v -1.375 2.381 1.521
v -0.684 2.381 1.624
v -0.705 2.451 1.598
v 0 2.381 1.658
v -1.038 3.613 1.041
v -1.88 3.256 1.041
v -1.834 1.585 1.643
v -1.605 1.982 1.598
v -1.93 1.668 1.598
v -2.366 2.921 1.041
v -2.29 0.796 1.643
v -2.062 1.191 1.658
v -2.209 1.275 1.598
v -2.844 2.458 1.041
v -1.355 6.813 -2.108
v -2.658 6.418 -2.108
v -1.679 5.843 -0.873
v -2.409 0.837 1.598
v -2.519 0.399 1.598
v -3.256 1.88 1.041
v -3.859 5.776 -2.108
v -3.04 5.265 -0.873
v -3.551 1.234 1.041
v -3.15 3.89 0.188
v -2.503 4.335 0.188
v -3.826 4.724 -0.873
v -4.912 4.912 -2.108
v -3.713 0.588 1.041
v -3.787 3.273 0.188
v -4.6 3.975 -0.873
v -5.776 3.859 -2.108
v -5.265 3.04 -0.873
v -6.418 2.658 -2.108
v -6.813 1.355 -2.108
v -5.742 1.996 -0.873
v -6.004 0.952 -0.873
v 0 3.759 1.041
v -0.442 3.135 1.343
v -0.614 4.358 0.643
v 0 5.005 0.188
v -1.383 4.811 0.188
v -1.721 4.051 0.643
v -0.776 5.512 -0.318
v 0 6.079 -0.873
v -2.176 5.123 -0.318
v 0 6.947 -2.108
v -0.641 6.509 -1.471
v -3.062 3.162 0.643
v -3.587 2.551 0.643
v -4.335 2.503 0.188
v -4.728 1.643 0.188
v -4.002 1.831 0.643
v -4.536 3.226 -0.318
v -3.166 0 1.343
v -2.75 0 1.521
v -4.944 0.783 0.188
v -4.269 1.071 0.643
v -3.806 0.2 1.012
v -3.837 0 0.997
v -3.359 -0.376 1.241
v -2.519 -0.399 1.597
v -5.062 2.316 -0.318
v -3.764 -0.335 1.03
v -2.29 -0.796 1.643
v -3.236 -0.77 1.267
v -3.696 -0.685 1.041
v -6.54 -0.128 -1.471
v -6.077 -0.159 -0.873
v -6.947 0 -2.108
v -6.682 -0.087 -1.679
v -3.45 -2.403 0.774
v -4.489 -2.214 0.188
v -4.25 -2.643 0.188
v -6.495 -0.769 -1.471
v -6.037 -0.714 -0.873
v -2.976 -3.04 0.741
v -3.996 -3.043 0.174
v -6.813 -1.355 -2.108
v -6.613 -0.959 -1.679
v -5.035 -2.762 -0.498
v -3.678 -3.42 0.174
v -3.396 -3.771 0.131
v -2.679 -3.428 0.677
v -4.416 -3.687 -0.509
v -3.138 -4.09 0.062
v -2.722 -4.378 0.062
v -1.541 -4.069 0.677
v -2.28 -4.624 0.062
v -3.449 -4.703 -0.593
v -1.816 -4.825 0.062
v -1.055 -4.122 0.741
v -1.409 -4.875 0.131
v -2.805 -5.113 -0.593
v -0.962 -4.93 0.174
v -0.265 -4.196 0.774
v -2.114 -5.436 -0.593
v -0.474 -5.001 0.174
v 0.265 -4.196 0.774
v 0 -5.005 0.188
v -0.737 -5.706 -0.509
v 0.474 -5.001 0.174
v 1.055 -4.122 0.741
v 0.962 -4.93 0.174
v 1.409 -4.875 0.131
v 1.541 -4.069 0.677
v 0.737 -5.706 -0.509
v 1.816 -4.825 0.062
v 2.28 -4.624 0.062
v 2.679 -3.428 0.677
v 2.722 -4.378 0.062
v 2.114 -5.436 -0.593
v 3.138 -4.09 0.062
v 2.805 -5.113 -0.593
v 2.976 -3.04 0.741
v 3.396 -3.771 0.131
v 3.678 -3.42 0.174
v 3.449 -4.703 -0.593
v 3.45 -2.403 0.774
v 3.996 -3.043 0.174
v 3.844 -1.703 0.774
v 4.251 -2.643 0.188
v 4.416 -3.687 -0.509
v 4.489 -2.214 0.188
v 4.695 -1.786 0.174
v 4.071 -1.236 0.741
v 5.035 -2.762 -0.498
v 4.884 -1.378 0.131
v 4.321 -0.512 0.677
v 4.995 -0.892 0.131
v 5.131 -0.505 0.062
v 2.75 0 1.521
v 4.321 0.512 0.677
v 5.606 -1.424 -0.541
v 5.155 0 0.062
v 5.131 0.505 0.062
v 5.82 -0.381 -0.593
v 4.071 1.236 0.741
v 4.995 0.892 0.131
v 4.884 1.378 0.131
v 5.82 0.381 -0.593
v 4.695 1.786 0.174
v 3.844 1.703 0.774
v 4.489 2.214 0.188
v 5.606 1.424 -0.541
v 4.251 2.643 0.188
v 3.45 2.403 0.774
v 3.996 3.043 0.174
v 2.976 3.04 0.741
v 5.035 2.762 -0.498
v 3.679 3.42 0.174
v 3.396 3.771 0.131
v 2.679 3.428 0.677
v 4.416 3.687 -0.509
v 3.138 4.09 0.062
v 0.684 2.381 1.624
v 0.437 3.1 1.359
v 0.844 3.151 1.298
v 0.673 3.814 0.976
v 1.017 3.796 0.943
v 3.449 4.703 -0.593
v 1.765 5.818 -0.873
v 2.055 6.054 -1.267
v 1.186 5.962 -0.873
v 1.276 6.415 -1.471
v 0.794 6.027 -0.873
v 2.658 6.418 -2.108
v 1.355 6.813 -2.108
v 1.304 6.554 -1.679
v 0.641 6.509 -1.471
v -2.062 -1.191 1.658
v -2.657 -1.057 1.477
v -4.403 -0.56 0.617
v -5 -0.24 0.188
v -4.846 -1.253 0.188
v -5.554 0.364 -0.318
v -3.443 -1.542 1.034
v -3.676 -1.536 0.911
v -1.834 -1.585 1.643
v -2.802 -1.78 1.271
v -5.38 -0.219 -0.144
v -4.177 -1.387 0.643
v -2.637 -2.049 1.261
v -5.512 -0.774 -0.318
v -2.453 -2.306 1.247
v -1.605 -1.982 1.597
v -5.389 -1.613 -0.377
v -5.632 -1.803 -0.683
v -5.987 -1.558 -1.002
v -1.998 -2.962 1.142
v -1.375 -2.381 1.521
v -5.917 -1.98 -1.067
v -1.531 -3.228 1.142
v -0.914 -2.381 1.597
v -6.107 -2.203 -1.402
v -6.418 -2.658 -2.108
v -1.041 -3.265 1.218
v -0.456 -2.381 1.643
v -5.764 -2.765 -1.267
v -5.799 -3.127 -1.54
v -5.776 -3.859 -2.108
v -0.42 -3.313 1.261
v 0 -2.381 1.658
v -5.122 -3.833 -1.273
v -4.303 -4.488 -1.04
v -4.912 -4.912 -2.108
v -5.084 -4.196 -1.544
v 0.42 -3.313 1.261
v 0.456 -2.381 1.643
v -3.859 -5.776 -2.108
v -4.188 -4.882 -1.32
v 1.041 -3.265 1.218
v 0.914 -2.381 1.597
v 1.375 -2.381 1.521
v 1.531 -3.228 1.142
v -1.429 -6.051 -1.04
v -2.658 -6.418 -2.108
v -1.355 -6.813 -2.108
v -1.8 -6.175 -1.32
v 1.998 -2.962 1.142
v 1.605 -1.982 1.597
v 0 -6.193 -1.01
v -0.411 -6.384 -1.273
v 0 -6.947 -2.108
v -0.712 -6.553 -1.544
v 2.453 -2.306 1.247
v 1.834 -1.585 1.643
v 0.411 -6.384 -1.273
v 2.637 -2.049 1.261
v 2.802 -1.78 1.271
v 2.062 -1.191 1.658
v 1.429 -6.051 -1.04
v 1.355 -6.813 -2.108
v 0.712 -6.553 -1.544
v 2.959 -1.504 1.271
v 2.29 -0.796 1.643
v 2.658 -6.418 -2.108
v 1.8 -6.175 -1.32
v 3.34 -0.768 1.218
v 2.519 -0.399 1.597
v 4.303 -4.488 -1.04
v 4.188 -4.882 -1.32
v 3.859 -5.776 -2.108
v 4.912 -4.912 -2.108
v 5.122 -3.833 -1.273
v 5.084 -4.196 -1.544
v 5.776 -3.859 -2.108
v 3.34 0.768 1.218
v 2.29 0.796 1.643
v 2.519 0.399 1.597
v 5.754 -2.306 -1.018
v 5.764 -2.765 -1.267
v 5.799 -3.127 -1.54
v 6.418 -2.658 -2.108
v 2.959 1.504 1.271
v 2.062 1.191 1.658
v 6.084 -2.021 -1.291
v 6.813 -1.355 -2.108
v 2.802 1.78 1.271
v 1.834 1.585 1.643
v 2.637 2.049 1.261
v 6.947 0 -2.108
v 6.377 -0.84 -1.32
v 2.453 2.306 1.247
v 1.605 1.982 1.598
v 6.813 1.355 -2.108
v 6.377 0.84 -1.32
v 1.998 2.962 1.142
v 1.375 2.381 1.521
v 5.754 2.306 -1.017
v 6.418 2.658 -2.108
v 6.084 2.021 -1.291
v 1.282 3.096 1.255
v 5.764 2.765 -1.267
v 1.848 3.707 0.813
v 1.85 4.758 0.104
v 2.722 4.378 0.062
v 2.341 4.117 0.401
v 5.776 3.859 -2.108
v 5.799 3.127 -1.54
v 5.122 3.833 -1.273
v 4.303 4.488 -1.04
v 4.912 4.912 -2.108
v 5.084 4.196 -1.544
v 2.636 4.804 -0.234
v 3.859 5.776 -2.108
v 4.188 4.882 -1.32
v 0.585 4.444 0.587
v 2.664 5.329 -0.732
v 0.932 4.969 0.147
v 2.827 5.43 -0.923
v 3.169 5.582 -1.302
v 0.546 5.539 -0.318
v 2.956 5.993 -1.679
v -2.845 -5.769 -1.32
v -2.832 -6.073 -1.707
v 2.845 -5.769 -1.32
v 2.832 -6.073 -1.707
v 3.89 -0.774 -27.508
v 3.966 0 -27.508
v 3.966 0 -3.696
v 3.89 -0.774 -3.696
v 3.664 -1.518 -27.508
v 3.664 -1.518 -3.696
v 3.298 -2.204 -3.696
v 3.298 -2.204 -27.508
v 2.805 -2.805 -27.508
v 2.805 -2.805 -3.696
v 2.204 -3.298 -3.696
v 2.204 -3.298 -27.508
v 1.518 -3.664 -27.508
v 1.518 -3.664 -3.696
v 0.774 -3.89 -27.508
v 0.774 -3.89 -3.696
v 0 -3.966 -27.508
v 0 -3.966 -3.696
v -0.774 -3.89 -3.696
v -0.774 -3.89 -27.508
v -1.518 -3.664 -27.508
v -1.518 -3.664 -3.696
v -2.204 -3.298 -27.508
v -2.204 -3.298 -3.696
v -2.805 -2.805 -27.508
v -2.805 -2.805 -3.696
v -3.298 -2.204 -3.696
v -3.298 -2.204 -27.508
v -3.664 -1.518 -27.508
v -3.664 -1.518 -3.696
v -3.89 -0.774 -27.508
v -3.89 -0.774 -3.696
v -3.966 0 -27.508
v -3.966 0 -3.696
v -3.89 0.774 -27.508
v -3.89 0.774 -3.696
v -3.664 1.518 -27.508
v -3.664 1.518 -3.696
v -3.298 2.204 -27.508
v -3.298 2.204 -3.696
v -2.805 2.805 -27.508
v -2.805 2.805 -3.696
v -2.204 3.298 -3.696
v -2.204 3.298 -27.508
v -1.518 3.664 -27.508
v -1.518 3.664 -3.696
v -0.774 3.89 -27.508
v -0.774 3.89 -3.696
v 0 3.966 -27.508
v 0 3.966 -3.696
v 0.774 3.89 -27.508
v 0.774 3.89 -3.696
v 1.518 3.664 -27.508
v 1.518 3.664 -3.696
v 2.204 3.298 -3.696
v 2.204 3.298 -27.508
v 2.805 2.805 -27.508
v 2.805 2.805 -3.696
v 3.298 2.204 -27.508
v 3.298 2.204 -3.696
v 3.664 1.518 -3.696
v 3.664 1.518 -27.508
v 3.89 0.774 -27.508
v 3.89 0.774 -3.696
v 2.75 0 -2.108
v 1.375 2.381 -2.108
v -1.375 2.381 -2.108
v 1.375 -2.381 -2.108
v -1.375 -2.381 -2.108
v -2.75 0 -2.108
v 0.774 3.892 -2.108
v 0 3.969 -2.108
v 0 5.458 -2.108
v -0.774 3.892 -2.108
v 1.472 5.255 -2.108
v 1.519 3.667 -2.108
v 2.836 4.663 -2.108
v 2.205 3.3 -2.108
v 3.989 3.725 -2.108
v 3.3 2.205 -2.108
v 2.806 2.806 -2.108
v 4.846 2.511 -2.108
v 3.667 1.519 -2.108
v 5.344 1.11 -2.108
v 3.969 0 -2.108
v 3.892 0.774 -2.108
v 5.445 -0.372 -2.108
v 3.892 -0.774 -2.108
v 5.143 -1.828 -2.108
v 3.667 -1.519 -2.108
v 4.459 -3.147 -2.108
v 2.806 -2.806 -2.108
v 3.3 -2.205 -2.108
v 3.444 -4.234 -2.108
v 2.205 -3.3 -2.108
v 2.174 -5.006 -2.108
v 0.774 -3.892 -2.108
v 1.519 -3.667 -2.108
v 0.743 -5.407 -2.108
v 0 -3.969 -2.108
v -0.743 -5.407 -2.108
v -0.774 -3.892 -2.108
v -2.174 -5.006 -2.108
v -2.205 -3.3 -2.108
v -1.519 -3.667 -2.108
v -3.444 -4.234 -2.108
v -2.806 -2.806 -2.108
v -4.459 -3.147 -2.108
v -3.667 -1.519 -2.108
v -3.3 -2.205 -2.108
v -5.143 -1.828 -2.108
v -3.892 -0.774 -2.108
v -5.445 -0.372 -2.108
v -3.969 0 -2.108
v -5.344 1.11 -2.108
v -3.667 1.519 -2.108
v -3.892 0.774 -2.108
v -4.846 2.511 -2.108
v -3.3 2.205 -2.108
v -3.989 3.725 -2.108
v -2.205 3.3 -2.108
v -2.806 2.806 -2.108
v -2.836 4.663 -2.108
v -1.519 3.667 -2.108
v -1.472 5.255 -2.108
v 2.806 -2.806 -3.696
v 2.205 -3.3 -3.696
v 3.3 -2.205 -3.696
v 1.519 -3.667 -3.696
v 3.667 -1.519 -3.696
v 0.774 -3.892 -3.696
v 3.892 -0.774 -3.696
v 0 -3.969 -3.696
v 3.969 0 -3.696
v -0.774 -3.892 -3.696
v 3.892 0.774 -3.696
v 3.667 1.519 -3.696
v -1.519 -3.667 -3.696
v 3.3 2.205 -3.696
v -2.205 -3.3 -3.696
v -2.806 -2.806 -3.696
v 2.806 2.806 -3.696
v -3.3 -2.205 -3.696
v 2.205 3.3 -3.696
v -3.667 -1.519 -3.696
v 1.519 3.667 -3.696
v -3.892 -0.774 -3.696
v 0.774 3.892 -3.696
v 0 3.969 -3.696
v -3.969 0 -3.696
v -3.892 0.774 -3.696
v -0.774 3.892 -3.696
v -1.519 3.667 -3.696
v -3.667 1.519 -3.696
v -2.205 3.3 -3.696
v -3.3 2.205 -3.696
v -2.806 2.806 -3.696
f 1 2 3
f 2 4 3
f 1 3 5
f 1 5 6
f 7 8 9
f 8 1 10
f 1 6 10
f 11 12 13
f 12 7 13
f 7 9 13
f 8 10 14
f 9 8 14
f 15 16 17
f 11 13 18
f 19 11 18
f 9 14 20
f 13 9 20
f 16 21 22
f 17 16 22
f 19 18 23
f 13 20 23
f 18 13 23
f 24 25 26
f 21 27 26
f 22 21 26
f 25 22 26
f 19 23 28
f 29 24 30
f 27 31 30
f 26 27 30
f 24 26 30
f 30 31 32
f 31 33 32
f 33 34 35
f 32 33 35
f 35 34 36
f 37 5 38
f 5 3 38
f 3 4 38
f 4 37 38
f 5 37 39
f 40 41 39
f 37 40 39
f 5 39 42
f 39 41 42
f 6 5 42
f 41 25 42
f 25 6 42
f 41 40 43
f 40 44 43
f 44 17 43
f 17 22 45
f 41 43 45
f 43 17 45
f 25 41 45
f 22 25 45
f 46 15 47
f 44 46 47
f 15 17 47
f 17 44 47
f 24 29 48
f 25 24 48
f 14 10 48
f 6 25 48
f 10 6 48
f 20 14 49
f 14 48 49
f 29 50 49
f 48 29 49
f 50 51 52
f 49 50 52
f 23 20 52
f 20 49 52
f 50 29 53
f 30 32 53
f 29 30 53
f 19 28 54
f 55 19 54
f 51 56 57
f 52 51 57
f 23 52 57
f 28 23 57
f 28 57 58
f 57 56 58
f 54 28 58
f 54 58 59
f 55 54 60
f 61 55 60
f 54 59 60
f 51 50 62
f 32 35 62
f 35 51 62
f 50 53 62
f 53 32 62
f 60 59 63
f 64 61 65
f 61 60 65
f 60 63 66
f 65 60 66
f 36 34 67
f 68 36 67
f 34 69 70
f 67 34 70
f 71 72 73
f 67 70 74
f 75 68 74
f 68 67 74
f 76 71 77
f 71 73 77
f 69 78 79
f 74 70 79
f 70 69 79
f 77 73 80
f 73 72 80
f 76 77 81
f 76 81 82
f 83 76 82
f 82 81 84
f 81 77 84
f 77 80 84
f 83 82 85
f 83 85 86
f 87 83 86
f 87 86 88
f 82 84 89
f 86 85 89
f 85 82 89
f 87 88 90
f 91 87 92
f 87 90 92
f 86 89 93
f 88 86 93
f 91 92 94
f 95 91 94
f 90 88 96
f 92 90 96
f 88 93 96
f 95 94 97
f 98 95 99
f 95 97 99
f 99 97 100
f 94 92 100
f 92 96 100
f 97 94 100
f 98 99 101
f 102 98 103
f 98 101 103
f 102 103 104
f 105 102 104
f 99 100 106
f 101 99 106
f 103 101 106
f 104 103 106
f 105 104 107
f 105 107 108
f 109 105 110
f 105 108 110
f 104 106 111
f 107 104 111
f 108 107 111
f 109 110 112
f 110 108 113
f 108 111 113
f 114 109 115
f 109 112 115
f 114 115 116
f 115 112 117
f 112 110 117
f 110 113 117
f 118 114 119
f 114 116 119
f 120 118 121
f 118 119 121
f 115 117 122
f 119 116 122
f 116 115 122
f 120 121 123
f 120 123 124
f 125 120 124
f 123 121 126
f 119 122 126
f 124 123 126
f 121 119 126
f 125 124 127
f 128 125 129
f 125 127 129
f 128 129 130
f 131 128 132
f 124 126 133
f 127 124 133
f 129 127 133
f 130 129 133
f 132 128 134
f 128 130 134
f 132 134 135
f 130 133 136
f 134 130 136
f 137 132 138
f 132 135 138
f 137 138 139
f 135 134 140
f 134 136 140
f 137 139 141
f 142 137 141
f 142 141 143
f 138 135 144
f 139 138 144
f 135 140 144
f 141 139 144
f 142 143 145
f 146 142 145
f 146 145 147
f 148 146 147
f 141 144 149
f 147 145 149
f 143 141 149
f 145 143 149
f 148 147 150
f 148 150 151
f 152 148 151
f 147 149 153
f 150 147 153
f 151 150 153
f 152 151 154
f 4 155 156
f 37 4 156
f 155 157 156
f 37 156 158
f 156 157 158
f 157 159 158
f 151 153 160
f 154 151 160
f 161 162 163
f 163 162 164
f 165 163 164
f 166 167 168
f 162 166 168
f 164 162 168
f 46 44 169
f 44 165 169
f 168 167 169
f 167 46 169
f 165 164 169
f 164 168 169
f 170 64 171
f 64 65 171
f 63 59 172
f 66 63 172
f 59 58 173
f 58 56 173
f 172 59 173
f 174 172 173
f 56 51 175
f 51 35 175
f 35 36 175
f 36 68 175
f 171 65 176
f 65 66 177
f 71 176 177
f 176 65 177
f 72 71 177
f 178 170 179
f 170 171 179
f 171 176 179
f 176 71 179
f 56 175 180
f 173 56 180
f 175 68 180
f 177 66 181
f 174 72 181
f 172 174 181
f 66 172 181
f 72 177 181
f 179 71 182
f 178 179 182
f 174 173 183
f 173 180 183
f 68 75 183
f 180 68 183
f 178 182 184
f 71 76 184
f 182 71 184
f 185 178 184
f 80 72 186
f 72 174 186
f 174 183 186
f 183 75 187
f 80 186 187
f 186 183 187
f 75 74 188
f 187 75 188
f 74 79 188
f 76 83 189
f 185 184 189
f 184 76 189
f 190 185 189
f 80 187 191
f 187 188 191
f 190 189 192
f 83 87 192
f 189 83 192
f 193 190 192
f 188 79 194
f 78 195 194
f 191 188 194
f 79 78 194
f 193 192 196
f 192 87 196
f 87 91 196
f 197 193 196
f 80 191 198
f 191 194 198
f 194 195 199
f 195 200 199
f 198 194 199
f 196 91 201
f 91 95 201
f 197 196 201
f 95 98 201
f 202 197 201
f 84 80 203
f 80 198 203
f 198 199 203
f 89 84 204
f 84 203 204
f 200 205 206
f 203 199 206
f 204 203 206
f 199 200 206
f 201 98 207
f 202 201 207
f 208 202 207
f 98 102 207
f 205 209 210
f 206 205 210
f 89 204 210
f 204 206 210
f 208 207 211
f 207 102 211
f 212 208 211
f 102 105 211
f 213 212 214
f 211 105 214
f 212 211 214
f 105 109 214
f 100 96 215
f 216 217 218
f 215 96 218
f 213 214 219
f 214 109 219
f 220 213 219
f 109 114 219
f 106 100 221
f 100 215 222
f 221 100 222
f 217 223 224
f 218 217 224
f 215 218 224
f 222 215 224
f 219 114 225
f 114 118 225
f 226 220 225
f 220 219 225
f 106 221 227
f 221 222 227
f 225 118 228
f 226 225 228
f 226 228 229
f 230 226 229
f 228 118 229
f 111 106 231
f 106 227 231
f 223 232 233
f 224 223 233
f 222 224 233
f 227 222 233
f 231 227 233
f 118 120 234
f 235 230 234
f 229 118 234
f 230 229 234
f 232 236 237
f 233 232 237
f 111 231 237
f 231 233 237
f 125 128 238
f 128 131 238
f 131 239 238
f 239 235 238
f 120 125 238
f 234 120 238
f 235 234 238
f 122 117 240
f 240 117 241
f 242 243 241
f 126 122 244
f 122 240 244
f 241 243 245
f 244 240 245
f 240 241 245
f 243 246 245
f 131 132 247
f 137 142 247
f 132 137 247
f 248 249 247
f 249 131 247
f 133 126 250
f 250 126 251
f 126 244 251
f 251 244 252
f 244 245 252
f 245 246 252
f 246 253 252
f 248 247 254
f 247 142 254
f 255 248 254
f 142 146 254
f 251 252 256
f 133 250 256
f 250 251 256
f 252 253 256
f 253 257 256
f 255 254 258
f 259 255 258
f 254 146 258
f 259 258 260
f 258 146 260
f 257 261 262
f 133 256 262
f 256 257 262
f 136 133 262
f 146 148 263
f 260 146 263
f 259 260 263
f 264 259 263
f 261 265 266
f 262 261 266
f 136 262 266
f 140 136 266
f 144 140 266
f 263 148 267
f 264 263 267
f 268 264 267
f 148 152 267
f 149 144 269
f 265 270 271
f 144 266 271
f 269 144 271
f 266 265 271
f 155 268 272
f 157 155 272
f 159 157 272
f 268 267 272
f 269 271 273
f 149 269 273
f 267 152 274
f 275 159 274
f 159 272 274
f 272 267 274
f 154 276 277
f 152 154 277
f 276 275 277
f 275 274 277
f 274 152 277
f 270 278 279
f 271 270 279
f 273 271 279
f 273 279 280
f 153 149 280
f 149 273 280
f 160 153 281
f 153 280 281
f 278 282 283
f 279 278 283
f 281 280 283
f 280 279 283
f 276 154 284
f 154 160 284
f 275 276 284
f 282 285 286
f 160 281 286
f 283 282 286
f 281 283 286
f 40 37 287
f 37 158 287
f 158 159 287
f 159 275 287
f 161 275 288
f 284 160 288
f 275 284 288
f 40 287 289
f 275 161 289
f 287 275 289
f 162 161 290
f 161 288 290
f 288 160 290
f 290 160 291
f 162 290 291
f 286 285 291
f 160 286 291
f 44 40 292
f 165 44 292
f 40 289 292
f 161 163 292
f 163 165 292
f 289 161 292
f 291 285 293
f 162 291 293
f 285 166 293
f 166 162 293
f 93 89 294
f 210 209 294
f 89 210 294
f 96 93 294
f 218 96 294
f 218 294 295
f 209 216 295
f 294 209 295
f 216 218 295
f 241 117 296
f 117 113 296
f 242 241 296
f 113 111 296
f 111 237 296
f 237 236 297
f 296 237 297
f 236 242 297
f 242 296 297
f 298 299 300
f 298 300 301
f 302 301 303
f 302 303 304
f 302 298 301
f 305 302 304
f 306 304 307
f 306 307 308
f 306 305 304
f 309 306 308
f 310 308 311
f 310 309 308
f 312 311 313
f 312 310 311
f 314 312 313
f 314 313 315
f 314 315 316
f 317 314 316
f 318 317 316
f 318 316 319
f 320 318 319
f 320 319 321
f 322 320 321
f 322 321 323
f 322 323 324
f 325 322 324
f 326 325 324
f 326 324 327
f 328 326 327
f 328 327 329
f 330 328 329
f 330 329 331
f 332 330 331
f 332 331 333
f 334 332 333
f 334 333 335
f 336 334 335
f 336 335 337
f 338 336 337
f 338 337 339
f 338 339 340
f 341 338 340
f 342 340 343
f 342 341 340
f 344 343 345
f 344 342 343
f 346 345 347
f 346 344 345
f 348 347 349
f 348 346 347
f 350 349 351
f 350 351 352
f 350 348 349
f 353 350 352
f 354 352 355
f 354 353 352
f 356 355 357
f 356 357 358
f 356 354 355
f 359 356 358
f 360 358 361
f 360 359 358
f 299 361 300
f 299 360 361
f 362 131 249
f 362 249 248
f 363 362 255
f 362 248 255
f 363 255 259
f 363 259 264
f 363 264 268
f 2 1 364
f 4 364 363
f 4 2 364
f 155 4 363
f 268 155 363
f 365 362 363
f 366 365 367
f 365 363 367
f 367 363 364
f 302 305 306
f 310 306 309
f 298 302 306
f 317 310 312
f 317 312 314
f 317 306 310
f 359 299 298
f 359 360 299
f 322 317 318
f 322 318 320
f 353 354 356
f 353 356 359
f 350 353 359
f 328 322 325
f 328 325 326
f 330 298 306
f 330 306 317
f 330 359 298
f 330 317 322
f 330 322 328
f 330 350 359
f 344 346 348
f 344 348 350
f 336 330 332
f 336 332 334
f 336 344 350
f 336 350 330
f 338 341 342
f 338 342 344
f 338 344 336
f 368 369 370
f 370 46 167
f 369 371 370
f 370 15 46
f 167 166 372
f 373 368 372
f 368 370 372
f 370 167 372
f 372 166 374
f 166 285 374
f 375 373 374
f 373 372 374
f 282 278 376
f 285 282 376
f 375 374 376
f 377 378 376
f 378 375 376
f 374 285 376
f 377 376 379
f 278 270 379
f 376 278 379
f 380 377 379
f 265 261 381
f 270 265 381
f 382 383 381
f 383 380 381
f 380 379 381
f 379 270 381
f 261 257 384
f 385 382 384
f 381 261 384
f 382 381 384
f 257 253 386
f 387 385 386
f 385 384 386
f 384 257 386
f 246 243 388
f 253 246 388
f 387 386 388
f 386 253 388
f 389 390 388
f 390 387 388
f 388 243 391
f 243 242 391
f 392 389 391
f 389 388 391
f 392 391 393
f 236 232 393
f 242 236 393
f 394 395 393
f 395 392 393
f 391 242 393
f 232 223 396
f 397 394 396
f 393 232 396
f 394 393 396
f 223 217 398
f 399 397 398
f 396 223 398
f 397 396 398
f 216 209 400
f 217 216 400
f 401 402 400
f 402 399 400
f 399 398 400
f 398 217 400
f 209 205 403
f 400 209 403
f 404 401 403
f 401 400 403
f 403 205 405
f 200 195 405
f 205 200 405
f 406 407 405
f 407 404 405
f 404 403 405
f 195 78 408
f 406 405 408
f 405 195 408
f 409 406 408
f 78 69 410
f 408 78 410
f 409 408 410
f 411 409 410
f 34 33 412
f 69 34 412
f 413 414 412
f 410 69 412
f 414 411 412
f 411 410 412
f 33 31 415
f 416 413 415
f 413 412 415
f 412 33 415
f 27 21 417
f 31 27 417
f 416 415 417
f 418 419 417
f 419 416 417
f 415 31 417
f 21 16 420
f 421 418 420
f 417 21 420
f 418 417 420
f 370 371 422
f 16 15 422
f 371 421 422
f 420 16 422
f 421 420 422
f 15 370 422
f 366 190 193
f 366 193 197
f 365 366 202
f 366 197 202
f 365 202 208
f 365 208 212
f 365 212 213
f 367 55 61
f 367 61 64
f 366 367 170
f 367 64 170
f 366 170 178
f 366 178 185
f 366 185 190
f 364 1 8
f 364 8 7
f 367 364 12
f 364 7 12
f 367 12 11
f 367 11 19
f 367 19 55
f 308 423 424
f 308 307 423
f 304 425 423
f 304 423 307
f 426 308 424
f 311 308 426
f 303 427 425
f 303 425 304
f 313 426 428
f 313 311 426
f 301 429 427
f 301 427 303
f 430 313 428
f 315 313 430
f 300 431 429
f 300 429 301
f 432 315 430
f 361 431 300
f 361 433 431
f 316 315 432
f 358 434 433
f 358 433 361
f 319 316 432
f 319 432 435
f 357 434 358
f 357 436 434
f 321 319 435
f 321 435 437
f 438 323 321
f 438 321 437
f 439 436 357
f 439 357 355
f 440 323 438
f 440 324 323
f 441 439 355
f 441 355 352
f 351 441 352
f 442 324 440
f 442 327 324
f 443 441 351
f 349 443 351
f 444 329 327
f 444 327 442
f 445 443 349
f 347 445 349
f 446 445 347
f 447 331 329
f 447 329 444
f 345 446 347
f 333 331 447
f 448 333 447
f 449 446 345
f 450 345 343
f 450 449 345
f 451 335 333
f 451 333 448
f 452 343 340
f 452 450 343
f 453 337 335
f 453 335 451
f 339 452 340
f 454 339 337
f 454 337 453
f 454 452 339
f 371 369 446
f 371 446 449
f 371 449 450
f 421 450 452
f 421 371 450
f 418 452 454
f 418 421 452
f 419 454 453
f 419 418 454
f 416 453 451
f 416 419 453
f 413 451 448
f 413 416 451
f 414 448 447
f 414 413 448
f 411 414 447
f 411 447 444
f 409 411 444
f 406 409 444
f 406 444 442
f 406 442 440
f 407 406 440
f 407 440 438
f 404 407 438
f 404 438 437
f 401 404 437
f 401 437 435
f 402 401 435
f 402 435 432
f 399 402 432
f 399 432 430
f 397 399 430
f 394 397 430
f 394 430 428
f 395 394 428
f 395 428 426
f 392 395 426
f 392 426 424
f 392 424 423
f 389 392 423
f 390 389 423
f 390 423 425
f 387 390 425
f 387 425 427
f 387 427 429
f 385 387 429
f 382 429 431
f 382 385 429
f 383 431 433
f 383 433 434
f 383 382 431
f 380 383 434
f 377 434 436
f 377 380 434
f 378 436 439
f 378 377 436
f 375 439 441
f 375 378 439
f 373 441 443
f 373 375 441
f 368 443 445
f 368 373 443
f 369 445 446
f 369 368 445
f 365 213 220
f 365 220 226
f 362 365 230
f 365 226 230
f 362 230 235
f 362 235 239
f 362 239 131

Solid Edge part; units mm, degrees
sketch "Sketch1" plane through (0, 0, 0) normal (1, 0, 0) x (0, 1, 0)
  line L0 (0, -2.1082) -> (0, 2.1082)
  arc A0 (0, 2.1082) -> (6.9469, -2.1082) centre (-0.3606, -6.3169) cw
  line L1 (0, -2.1082) -> (6.9469, -2.1082)
  dimension "D1" = 4.2164
  dimension "D2" = 8.4328
revolve "RevolvedProtrusion1" add sketch "Sketch1" angle 360 about axis through (0, 0, -14.7796) along (0, 0, 1)
sketch "Sketch2" plane through (0, 0, -2.1082) normal (0, 0, -1) x (0, 1, 0)
  circle A0 centre (0, 0) radius 3.9687
  dimension "D1" = 7.9375
extrude "Protrusion1" add sketch "Sketch2" along normal blind 25.4
sketch "Sketch3" plane through (0, 0, -27.5082) normal (0, 0, -1) x (1, 0, 0)
  circle A0 centre (0, 0) radius 3.9662
  dimension "D1" = 0.0025
extrude "Cutout1" cut sketch "Sketch3" against normal blind 23.8125 flip side to cut
sketch "Sketch4" plane through (-0.6032, 0.3606, 4.2164) normal (0, 0, 1) x (1, 0, 0)
  line L0 (-0.7716, 2.0206) -> (1.978, 2.0206)
  line L1 (3.3529, -0.3606) -> (1.978, 2.0206)
  line L2 (1.978, -2.7419) -> (3.3529, -0.3606)
  line L3 (-0.7716, -2.7419) -> (1.978, -2.7419)
  line L4 (-2.1464, -0.3606) -> (-0.7716, -2.7419)
  line L5 (-0.7716, 2.0206) -> (-2.1464, -0.3606)
extrude "ExtrudedCutout_11" cut sketch "Sketch4" against normal blind 6.3246
properties part number "146368"
